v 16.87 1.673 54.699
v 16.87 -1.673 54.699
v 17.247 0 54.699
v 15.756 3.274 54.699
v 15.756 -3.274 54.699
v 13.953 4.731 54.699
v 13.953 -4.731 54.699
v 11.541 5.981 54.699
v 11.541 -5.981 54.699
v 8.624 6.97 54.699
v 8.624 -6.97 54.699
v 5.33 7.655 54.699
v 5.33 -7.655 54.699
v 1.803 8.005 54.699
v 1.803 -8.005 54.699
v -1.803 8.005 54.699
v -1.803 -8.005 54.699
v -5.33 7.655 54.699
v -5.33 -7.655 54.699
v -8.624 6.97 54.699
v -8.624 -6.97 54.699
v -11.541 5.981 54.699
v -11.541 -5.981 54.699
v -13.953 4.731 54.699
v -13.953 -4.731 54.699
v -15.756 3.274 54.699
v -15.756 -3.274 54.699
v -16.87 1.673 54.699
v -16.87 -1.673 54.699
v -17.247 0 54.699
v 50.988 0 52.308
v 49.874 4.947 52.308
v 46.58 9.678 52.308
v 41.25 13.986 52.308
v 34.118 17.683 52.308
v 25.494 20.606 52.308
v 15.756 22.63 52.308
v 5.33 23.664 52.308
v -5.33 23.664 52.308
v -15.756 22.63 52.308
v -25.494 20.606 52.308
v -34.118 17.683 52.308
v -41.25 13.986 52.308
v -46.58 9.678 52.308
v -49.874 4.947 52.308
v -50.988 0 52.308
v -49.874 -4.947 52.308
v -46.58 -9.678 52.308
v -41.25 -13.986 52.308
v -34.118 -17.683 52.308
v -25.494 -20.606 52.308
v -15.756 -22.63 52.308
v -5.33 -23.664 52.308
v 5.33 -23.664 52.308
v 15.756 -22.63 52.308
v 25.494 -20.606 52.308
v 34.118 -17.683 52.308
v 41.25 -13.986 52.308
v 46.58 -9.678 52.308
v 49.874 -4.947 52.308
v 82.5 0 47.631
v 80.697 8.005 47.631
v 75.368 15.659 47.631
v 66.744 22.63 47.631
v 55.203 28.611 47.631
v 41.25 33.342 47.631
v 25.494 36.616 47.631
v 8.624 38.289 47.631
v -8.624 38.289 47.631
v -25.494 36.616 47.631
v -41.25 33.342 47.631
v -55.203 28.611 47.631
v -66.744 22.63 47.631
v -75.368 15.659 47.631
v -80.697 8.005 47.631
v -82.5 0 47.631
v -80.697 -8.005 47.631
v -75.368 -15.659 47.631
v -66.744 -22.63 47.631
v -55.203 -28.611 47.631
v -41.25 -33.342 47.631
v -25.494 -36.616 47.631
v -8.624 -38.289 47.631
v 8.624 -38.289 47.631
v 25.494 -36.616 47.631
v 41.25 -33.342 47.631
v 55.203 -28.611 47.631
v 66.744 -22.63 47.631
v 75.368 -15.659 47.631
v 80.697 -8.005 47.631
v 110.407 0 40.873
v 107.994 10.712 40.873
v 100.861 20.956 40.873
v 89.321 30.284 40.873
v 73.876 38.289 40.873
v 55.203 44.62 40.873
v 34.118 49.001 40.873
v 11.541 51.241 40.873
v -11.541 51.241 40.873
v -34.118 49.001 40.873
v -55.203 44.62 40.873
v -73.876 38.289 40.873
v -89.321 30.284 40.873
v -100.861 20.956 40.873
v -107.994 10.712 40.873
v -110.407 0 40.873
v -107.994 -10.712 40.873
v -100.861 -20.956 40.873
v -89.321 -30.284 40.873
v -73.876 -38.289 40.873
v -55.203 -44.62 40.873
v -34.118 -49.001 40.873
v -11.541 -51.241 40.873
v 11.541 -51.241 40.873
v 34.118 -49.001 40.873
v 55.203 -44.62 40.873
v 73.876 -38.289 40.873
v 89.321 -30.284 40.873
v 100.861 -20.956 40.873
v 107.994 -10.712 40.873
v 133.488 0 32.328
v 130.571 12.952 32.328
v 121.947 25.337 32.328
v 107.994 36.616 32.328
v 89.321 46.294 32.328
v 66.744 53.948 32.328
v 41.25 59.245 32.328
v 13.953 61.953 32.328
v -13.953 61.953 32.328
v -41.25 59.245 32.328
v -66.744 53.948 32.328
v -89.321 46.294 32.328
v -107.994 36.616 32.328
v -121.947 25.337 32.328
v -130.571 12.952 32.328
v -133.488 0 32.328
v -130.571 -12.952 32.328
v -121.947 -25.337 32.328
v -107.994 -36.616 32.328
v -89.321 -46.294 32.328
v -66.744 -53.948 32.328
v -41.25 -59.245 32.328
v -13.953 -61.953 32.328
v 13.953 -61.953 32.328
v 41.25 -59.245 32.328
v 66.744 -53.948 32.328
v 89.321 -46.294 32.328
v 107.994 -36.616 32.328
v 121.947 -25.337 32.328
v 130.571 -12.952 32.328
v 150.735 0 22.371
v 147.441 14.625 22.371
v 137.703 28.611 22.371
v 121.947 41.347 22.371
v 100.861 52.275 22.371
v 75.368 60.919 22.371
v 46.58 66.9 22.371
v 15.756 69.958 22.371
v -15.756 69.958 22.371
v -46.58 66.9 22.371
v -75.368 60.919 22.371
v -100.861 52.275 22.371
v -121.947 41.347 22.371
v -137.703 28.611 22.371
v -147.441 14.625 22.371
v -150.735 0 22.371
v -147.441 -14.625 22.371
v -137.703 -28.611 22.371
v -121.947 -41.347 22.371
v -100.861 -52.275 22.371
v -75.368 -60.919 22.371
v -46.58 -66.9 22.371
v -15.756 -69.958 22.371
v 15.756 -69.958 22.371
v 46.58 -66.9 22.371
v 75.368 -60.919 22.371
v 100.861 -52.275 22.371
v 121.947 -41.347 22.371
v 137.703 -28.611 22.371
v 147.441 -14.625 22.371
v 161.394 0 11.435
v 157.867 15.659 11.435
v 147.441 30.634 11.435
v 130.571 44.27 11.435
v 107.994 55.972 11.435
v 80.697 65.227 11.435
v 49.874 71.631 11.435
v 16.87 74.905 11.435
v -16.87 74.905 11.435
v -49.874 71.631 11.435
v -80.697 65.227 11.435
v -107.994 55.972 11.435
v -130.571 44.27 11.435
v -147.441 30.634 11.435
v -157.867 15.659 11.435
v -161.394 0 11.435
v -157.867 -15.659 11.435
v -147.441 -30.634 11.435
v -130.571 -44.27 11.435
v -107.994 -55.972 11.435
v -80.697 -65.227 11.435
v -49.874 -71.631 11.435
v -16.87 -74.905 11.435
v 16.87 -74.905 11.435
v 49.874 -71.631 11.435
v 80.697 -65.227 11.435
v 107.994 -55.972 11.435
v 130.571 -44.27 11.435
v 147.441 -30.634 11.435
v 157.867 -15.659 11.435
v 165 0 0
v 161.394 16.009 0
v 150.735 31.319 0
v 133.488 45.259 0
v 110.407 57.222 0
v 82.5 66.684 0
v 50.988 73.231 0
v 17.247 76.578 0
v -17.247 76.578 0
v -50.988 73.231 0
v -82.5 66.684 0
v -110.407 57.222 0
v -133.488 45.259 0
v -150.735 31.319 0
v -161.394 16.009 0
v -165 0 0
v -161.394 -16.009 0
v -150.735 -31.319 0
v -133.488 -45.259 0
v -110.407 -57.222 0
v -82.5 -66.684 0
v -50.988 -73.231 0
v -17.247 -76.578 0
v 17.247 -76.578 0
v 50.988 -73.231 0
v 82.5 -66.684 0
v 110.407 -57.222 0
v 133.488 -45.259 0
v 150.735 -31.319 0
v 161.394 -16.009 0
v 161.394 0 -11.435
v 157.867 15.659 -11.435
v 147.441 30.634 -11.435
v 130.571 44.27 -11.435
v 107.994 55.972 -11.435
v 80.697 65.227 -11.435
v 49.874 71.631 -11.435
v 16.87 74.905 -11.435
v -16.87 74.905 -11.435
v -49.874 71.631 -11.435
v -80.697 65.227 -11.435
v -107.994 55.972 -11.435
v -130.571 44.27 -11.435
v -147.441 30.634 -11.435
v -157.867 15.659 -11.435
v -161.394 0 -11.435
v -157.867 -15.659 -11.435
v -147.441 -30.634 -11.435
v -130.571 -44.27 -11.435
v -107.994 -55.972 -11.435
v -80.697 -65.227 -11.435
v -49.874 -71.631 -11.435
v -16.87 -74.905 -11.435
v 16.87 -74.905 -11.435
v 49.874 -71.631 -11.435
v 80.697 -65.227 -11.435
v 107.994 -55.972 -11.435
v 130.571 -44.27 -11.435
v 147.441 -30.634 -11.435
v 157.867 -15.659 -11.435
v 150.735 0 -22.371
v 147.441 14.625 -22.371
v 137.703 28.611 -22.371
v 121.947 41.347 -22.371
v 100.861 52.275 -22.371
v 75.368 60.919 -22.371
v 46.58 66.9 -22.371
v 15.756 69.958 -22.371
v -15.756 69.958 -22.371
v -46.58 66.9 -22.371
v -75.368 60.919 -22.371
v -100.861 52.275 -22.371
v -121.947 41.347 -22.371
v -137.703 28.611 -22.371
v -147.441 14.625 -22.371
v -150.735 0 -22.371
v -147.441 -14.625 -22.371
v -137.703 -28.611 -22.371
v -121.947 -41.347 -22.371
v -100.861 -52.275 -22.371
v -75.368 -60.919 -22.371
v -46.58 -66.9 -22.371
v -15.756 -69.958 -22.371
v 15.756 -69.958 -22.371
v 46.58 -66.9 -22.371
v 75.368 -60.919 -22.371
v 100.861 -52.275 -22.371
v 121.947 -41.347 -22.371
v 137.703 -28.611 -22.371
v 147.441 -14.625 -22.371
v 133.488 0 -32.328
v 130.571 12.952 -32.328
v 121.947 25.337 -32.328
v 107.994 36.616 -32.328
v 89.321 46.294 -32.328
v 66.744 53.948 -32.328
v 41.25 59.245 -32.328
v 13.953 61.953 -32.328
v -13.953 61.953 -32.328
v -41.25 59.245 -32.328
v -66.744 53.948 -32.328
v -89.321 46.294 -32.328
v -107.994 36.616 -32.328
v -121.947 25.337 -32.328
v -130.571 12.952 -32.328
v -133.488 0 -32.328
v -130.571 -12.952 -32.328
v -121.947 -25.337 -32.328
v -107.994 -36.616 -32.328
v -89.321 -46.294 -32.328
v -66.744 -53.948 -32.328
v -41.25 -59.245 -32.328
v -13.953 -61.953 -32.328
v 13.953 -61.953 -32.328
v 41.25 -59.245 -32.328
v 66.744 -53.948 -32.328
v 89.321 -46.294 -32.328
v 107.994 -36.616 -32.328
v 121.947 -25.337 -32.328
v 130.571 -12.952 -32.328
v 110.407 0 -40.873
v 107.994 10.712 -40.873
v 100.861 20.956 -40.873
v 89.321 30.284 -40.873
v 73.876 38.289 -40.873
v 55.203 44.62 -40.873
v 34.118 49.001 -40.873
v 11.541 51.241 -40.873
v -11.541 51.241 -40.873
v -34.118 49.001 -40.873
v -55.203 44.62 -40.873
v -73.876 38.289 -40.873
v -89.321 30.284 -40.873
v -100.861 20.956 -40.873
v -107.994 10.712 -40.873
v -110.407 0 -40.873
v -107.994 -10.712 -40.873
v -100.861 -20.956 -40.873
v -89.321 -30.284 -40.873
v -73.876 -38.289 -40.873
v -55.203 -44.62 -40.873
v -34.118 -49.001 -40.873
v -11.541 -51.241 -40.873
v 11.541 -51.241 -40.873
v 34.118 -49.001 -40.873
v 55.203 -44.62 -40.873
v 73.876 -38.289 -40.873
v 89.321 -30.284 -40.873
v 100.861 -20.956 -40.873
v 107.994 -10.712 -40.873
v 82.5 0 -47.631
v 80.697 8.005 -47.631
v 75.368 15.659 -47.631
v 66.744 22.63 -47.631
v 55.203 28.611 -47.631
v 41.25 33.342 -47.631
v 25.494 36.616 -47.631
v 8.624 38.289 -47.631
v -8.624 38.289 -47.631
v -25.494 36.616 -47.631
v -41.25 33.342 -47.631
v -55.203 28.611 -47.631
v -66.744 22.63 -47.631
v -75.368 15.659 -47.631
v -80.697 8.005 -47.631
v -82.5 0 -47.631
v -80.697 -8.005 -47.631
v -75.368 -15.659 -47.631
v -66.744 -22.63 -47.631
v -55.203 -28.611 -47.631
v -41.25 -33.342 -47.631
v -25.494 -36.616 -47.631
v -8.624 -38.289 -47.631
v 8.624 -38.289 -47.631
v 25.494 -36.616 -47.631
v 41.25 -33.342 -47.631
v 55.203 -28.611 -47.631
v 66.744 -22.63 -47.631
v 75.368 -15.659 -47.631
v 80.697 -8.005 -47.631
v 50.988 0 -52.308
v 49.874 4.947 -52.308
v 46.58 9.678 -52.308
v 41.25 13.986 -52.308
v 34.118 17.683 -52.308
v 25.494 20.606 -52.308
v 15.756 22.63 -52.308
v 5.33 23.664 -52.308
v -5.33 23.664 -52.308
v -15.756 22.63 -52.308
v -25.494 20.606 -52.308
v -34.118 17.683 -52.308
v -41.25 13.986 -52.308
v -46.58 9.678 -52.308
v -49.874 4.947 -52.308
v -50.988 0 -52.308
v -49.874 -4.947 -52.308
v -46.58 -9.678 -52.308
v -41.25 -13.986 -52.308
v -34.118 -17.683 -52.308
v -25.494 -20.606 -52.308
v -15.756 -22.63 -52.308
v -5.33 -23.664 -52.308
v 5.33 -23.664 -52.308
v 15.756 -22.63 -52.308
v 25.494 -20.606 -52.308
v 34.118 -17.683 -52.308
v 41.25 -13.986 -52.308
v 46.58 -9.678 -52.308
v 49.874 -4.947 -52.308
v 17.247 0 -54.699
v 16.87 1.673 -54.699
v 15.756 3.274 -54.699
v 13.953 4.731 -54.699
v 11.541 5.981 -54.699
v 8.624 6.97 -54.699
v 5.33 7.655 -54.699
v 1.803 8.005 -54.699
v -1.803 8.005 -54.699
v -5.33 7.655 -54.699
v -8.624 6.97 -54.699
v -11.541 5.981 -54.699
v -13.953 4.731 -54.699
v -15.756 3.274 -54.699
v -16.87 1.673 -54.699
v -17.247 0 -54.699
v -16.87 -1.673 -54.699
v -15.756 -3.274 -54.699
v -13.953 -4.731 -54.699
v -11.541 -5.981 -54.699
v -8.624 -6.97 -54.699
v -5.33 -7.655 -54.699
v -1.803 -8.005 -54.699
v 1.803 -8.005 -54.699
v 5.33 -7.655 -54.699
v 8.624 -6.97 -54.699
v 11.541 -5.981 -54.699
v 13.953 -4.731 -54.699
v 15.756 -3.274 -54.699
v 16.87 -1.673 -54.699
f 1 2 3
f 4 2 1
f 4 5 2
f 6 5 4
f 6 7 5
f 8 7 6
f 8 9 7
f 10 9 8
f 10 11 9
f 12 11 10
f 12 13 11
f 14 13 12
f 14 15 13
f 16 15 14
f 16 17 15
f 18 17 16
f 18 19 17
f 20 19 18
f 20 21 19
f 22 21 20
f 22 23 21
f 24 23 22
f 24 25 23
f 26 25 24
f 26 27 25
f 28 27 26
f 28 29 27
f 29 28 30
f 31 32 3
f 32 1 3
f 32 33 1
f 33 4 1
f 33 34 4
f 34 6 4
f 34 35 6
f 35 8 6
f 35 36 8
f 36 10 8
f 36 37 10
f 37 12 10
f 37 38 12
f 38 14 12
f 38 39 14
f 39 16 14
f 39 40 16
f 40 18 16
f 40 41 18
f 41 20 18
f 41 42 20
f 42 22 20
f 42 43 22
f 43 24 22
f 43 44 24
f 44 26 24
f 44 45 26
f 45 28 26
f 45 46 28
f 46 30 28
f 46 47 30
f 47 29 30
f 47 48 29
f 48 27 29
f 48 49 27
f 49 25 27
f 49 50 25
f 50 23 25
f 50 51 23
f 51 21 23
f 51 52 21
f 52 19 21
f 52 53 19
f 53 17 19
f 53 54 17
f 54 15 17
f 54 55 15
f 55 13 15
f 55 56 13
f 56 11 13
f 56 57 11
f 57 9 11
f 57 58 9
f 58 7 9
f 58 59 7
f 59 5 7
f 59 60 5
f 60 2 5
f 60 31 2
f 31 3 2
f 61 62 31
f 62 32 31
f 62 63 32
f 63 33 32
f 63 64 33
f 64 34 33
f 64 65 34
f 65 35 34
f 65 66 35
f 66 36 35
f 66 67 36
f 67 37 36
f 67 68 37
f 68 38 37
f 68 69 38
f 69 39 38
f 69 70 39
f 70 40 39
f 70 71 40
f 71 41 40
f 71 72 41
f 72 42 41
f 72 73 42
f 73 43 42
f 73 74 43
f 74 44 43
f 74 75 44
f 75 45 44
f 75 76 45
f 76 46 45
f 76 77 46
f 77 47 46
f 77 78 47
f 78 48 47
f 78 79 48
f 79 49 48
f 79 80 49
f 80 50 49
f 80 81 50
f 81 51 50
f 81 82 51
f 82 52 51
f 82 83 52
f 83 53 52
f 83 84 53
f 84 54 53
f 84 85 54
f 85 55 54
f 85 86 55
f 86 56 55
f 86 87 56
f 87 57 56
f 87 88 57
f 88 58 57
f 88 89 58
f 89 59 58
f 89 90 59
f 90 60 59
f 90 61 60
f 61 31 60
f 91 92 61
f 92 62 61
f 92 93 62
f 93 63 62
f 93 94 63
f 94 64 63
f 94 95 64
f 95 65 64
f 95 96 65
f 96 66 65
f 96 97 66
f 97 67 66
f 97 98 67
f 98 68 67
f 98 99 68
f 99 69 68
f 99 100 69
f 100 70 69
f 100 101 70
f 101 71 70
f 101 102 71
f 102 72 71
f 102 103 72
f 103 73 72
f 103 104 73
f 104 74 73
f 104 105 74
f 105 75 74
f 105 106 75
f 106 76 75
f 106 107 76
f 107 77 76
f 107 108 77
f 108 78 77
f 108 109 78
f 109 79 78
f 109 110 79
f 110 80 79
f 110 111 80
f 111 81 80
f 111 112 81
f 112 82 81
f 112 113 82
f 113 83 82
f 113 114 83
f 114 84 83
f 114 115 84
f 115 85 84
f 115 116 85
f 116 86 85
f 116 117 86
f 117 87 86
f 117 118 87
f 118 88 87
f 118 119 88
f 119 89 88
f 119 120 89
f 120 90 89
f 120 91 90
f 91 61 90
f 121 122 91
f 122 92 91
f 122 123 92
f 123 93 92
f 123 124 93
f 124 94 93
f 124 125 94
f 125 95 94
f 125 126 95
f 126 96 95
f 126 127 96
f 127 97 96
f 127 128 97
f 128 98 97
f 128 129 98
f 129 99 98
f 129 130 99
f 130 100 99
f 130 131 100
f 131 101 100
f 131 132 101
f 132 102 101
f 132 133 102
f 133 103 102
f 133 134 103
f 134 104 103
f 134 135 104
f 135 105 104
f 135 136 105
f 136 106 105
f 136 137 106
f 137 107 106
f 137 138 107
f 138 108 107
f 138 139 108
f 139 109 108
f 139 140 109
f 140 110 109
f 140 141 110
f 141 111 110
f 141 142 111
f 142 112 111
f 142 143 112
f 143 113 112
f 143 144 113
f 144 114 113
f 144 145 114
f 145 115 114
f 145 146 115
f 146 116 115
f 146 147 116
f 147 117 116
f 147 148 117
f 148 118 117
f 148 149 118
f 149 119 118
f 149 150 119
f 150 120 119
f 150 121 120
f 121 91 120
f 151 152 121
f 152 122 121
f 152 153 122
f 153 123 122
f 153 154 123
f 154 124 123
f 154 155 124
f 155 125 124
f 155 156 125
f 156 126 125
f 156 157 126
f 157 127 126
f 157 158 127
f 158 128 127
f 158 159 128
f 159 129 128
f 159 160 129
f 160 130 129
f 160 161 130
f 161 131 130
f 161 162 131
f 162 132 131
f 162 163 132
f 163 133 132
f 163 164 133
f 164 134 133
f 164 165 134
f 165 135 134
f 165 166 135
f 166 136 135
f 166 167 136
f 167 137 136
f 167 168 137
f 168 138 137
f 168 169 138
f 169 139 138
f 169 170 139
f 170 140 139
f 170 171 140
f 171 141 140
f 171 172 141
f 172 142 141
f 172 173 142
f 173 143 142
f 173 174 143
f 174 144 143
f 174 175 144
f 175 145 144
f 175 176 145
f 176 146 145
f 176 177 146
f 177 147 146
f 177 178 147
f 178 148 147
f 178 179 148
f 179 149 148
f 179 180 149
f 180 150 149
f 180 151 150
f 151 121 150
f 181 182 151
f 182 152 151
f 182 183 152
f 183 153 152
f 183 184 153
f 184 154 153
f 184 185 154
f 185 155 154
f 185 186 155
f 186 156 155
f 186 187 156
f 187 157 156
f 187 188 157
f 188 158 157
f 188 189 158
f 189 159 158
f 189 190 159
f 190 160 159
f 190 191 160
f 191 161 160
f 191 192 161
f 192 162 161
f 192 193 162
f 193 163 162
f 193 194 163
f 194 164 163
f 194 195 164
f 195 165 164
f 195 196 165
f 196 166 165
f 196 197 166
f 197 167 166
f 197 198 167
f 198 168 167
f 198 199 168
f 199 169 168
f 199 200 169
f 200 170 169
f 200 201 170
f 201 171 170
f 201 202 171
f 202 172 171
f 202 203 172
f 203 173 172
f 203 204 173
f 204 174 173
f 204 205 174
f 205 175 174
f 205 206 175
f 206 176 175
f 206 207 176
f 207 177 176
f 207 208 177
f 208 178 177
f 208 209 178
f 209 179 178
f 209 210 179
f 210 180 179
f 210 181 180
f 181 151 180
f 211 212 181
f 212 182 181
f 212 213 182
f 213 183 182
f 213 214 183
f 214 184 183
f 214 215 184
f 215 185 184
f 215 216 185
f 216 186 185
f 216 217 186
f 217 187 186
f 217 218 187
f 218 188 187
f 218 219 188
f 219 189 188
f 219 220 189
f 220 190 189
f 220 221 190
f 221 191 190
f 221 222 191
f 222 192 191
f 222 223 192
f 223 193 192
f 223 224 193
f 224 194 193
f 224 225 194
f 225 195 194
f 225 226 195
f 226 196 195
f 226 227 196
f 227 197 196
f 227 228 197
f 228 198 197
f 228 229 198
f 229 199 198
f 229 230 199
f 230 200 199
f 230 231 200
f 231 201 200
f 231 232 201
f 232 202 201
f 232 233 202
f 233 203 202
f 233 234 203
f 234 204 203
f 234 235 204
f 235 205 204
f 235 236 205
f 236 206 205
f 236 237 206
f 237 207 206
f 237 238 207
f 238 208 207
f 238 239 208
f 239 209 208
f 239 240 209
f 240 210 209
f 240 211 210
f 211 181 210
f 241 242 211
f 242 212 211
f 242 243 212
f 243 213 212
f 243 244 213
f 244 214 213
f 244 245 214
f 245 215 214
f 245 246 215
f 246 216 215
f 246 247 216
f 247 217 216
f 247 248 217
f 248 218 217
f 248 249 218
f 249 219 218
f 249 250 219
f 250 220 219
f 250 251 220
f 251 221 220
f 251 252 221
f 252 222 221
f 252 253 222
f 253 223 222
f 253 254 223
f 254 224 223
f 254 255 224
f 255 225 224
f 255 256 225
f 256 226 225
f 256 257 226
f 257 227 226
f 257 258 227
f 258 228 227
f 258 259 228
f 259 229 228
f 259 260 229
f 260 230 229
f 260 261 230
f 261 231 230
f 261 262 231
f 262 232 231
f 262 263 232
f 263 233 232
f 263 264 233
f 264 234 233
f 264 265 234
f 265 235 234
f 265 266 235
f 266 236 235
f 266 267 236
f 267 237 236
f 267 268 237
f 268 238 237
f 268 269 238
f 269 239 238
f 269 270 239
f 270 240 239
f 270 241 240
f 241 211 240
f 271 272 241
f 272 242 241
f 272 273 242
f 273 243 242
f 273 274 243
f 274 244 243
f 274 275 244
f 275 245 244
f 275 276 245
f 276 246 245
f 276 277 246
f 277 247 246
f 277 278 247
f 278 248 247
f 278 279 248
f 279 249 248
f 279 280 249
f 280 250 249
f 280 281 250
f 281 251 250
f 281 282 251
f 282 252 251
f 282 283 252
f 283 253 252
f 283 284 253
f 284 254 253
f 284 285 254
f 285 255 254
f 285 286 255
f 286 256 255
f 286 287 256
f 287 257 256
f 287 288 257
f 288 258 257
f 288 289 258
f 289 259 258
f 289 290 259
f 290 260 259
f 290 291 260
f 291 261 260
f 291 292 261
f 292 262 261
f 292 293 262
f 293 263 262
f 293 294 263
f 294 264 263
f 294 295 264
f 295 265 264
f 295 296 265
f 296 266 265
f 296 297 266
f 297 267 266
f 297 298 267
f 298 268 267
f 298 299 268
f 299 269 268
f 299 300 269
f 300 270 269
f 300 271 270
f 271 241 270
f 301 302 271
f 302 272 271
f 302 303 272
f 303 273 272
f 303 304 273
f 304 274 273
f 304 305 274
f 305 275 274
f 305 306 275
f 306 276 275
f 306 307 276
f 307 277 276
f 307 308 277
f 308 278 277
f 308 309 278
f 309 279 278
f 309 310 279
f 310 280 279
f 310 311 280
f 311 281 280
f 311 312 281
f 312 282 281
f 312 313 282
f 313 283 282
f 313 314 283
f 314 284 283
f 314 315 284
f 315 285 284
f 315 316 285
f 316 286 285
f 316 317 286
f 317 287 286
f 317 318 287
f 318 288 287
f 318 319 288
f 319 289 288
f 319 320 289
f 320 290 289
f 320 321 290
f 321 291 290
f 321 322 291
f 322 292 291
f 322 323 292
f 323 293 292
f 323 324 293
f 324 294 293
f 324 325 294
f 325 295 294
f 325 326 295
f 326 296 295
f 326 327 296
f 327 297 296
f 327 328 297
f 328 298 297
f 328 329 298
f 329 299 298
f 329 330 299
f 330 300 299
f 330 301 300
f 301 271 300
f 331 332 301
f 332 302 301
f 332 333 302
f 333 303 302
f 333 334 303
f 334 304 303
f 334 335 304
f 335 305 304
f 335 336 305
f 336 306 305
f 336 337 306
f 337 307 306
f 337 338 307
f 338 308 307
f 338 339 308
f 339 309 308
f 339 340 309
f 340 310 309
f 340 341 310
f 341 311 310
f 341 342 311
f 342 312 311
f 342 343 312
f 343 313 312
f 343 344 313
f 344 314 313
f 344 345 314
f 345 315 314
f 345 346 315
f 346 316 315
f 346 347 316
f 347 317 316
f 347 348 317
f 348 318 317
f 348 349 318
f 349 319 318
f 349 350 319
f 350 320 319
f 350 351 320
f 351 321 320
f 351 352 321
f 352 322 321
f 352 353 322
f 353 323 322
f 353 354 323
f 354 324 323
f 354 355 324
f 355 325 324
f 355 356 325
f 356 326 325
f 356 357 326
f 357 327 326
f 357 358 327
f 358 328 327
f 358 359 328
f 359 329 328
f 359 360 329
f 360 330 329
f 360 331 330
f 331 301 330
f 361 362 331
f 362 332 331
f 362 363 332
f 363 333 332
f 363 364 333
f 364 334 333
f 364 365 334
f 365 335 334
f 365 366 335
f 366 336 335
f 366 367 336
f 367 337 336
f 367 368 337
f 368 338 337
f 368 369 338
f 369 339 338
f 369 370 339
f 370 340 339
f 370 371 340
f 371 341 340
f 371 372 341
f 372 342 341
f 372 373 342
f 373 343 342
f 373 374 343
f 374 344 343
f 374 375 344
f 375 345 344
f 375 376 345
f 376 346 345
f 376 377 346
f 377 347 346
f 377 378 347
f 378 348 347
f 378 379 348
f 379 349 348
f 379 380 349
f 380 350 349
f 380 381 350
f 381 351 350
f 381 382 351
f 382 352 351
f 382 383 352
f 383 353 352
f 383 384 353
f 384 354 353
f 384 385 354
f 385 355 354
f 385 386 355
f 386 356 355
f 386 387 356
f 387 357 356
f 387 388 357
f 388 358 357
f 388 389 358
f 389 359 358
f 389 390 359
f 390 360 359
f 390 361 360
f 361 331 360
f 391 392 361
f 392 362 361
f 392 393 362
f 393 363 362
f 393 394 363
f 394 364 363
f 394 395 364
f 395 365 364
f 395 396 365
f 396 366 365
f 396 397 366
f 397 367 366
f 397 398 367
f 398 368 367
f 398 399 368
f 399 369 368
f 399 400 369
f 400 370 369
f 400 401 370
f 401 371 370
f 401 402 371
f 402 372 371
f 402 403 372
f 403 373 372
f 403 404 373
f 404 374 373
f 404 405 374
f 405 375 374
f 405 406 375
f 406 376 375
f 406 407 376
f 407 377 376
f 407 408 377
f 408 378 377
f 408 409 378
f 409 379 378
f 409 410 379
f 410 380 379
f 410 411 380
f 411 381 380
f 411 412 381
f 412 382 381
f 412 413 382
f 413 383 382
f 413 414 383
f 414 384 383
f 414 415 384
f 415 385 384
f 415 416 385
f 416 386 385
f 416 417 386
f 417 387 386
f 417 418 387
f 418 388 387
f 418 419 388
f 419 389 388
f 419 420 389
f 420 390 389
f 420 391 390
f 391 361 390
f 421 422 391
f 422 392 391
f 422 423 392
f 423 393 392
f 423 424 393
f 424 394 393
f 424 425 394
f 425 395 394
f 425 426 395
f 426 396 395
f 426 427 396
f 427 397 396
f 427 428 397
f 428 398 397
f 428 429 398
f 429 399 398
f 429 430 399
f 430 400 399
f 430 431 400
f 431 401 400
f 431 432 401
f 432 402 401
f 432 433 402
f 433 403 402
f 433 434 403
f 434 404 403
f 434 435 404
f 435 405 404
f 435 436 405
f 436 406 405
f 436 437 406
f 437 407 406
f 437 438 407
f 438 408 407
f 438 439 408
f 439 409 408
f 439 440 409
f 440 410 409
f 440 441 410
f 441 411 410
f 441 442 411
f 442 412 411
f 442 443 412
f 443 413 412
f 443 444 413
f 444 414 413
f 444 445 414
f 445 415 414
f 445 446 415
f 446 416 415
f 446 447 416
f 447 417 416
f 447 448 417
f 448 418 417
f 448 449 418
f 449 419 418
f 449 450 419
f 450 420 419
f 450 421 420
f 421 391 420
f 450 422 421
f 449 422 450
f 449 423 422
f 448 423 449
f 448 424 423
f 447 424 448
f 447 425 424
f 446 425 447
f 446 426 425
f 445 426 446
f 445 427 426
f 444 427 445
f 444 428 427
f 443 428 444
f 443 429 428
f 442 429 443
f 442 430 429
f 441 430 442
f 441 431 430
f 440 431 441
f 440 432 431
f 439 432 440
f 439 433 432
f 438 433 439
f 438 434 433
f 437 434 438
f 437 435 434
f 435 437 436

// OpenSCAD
// Generated by SolidPython 1.0.1 on 2020-07-29 00:46:51


scale(v = [15, 7, 5]) {
	sphere(r = 11);
}
/***********************************************
*********      SolidPython code:      **********
************************************************
 
# import packages: SolidPython
from solid import *
from solid.utils import *
from itertools import chain, combinations, permutations


class Resize:

    def __init__(self, scad_file):
        self.scad_file = scad_file
        #self.scad_file = import_scad(scad_file)
        # cone/cylinder param:
        self.r1 = 0
        self.r2 = 0
        self.h = 0
        # rectangular prism param:
        self.w = 0
        self.l = 0
        # ellipse param:
        self.r = 0

    # import OpenScad code (file name corresponds to shape)


    # classify shape + parameters
    def assign(self, param1, param2, param3):
        if self.scad_file == 'cone.scad':
            self.r1 = param1
            self.r2 = param2
            self.h = param3
        elif self.scad_file == 'cylinder.scad':
            self.r1 = param1
            self.r2 = param2
            self.h = param3
        elif self.scad_file == 'rectangularPrism.scad':
            self.h = param1
            self.l = param2
            self.w = param3
        else:
            self.r = param1
            self.h = param2

    # resize parameters
    def iterate(self):
        x = range(3, 20, 2)
        i = 1
        if self.scad_file == 'cone.scad':
            tempList = list(permutations(x, 2))
            for temp in tempList:
                param1 = temp[0]
                param2 = temp[1]
                filepath = 'produced_scad_files/' + 'cone' + str(param1) + '_' + str(param2) + '_' + '.scad'
                scad_render_to_file(cylinder(h=param1, r1=param2, r2=0), filepath)

        elif self.scad_file == 'cylinder.scad':
            tempList = list(permutations(x, 3))
            for temp in tempList:
                param1 = temp[0]
                param2 = temp[1]
                filepath = 'produced_scad_files/' + 'cylinder' + str(param1) + '_' + str(param2) + '_' + '.scad'
                scad_render_to_file(cylinder(h=param1, r1=param2, r2=param2), filepath)

        elif self.scad_file == 'rectangularPrism.scad':
            tempList = list(permutations(x, 3))
            for temp in tempList:
                param1 = temp[0]
                param2 = temp[1]
                param3 = temp[2]
                filepath = 'produced_scad_files/' + 'rectangularPrism' + str(param1) + '_' + str(param2) + '_' + str(
                    param3) + '.scad'
                scad_render_to_file(cube(size=(param1, param2, param3)), filepath)

        elif self.scad_file == 'ellipse.scad':
            tempList = list(permutations(x, 4))
            for temp in tempList:
                param1 = temp[0]
                param2 = temp[1]
                param3 = temp[2]
                param4 = temp[3]
                filepath = 'produced_scad_files/' + 'ellipse' + str(param1) + '_' + str(param2) + '_' + str(param3) + '_' + str(param4) + '.scad'
                scad_render_to_file(scale([param1, param2, param3])(sphere(r=param4)), filepath)

    def render_to_scadfile(self):
        scad_render_to_file(scad, 'example.scad') 
 
************************************************/
